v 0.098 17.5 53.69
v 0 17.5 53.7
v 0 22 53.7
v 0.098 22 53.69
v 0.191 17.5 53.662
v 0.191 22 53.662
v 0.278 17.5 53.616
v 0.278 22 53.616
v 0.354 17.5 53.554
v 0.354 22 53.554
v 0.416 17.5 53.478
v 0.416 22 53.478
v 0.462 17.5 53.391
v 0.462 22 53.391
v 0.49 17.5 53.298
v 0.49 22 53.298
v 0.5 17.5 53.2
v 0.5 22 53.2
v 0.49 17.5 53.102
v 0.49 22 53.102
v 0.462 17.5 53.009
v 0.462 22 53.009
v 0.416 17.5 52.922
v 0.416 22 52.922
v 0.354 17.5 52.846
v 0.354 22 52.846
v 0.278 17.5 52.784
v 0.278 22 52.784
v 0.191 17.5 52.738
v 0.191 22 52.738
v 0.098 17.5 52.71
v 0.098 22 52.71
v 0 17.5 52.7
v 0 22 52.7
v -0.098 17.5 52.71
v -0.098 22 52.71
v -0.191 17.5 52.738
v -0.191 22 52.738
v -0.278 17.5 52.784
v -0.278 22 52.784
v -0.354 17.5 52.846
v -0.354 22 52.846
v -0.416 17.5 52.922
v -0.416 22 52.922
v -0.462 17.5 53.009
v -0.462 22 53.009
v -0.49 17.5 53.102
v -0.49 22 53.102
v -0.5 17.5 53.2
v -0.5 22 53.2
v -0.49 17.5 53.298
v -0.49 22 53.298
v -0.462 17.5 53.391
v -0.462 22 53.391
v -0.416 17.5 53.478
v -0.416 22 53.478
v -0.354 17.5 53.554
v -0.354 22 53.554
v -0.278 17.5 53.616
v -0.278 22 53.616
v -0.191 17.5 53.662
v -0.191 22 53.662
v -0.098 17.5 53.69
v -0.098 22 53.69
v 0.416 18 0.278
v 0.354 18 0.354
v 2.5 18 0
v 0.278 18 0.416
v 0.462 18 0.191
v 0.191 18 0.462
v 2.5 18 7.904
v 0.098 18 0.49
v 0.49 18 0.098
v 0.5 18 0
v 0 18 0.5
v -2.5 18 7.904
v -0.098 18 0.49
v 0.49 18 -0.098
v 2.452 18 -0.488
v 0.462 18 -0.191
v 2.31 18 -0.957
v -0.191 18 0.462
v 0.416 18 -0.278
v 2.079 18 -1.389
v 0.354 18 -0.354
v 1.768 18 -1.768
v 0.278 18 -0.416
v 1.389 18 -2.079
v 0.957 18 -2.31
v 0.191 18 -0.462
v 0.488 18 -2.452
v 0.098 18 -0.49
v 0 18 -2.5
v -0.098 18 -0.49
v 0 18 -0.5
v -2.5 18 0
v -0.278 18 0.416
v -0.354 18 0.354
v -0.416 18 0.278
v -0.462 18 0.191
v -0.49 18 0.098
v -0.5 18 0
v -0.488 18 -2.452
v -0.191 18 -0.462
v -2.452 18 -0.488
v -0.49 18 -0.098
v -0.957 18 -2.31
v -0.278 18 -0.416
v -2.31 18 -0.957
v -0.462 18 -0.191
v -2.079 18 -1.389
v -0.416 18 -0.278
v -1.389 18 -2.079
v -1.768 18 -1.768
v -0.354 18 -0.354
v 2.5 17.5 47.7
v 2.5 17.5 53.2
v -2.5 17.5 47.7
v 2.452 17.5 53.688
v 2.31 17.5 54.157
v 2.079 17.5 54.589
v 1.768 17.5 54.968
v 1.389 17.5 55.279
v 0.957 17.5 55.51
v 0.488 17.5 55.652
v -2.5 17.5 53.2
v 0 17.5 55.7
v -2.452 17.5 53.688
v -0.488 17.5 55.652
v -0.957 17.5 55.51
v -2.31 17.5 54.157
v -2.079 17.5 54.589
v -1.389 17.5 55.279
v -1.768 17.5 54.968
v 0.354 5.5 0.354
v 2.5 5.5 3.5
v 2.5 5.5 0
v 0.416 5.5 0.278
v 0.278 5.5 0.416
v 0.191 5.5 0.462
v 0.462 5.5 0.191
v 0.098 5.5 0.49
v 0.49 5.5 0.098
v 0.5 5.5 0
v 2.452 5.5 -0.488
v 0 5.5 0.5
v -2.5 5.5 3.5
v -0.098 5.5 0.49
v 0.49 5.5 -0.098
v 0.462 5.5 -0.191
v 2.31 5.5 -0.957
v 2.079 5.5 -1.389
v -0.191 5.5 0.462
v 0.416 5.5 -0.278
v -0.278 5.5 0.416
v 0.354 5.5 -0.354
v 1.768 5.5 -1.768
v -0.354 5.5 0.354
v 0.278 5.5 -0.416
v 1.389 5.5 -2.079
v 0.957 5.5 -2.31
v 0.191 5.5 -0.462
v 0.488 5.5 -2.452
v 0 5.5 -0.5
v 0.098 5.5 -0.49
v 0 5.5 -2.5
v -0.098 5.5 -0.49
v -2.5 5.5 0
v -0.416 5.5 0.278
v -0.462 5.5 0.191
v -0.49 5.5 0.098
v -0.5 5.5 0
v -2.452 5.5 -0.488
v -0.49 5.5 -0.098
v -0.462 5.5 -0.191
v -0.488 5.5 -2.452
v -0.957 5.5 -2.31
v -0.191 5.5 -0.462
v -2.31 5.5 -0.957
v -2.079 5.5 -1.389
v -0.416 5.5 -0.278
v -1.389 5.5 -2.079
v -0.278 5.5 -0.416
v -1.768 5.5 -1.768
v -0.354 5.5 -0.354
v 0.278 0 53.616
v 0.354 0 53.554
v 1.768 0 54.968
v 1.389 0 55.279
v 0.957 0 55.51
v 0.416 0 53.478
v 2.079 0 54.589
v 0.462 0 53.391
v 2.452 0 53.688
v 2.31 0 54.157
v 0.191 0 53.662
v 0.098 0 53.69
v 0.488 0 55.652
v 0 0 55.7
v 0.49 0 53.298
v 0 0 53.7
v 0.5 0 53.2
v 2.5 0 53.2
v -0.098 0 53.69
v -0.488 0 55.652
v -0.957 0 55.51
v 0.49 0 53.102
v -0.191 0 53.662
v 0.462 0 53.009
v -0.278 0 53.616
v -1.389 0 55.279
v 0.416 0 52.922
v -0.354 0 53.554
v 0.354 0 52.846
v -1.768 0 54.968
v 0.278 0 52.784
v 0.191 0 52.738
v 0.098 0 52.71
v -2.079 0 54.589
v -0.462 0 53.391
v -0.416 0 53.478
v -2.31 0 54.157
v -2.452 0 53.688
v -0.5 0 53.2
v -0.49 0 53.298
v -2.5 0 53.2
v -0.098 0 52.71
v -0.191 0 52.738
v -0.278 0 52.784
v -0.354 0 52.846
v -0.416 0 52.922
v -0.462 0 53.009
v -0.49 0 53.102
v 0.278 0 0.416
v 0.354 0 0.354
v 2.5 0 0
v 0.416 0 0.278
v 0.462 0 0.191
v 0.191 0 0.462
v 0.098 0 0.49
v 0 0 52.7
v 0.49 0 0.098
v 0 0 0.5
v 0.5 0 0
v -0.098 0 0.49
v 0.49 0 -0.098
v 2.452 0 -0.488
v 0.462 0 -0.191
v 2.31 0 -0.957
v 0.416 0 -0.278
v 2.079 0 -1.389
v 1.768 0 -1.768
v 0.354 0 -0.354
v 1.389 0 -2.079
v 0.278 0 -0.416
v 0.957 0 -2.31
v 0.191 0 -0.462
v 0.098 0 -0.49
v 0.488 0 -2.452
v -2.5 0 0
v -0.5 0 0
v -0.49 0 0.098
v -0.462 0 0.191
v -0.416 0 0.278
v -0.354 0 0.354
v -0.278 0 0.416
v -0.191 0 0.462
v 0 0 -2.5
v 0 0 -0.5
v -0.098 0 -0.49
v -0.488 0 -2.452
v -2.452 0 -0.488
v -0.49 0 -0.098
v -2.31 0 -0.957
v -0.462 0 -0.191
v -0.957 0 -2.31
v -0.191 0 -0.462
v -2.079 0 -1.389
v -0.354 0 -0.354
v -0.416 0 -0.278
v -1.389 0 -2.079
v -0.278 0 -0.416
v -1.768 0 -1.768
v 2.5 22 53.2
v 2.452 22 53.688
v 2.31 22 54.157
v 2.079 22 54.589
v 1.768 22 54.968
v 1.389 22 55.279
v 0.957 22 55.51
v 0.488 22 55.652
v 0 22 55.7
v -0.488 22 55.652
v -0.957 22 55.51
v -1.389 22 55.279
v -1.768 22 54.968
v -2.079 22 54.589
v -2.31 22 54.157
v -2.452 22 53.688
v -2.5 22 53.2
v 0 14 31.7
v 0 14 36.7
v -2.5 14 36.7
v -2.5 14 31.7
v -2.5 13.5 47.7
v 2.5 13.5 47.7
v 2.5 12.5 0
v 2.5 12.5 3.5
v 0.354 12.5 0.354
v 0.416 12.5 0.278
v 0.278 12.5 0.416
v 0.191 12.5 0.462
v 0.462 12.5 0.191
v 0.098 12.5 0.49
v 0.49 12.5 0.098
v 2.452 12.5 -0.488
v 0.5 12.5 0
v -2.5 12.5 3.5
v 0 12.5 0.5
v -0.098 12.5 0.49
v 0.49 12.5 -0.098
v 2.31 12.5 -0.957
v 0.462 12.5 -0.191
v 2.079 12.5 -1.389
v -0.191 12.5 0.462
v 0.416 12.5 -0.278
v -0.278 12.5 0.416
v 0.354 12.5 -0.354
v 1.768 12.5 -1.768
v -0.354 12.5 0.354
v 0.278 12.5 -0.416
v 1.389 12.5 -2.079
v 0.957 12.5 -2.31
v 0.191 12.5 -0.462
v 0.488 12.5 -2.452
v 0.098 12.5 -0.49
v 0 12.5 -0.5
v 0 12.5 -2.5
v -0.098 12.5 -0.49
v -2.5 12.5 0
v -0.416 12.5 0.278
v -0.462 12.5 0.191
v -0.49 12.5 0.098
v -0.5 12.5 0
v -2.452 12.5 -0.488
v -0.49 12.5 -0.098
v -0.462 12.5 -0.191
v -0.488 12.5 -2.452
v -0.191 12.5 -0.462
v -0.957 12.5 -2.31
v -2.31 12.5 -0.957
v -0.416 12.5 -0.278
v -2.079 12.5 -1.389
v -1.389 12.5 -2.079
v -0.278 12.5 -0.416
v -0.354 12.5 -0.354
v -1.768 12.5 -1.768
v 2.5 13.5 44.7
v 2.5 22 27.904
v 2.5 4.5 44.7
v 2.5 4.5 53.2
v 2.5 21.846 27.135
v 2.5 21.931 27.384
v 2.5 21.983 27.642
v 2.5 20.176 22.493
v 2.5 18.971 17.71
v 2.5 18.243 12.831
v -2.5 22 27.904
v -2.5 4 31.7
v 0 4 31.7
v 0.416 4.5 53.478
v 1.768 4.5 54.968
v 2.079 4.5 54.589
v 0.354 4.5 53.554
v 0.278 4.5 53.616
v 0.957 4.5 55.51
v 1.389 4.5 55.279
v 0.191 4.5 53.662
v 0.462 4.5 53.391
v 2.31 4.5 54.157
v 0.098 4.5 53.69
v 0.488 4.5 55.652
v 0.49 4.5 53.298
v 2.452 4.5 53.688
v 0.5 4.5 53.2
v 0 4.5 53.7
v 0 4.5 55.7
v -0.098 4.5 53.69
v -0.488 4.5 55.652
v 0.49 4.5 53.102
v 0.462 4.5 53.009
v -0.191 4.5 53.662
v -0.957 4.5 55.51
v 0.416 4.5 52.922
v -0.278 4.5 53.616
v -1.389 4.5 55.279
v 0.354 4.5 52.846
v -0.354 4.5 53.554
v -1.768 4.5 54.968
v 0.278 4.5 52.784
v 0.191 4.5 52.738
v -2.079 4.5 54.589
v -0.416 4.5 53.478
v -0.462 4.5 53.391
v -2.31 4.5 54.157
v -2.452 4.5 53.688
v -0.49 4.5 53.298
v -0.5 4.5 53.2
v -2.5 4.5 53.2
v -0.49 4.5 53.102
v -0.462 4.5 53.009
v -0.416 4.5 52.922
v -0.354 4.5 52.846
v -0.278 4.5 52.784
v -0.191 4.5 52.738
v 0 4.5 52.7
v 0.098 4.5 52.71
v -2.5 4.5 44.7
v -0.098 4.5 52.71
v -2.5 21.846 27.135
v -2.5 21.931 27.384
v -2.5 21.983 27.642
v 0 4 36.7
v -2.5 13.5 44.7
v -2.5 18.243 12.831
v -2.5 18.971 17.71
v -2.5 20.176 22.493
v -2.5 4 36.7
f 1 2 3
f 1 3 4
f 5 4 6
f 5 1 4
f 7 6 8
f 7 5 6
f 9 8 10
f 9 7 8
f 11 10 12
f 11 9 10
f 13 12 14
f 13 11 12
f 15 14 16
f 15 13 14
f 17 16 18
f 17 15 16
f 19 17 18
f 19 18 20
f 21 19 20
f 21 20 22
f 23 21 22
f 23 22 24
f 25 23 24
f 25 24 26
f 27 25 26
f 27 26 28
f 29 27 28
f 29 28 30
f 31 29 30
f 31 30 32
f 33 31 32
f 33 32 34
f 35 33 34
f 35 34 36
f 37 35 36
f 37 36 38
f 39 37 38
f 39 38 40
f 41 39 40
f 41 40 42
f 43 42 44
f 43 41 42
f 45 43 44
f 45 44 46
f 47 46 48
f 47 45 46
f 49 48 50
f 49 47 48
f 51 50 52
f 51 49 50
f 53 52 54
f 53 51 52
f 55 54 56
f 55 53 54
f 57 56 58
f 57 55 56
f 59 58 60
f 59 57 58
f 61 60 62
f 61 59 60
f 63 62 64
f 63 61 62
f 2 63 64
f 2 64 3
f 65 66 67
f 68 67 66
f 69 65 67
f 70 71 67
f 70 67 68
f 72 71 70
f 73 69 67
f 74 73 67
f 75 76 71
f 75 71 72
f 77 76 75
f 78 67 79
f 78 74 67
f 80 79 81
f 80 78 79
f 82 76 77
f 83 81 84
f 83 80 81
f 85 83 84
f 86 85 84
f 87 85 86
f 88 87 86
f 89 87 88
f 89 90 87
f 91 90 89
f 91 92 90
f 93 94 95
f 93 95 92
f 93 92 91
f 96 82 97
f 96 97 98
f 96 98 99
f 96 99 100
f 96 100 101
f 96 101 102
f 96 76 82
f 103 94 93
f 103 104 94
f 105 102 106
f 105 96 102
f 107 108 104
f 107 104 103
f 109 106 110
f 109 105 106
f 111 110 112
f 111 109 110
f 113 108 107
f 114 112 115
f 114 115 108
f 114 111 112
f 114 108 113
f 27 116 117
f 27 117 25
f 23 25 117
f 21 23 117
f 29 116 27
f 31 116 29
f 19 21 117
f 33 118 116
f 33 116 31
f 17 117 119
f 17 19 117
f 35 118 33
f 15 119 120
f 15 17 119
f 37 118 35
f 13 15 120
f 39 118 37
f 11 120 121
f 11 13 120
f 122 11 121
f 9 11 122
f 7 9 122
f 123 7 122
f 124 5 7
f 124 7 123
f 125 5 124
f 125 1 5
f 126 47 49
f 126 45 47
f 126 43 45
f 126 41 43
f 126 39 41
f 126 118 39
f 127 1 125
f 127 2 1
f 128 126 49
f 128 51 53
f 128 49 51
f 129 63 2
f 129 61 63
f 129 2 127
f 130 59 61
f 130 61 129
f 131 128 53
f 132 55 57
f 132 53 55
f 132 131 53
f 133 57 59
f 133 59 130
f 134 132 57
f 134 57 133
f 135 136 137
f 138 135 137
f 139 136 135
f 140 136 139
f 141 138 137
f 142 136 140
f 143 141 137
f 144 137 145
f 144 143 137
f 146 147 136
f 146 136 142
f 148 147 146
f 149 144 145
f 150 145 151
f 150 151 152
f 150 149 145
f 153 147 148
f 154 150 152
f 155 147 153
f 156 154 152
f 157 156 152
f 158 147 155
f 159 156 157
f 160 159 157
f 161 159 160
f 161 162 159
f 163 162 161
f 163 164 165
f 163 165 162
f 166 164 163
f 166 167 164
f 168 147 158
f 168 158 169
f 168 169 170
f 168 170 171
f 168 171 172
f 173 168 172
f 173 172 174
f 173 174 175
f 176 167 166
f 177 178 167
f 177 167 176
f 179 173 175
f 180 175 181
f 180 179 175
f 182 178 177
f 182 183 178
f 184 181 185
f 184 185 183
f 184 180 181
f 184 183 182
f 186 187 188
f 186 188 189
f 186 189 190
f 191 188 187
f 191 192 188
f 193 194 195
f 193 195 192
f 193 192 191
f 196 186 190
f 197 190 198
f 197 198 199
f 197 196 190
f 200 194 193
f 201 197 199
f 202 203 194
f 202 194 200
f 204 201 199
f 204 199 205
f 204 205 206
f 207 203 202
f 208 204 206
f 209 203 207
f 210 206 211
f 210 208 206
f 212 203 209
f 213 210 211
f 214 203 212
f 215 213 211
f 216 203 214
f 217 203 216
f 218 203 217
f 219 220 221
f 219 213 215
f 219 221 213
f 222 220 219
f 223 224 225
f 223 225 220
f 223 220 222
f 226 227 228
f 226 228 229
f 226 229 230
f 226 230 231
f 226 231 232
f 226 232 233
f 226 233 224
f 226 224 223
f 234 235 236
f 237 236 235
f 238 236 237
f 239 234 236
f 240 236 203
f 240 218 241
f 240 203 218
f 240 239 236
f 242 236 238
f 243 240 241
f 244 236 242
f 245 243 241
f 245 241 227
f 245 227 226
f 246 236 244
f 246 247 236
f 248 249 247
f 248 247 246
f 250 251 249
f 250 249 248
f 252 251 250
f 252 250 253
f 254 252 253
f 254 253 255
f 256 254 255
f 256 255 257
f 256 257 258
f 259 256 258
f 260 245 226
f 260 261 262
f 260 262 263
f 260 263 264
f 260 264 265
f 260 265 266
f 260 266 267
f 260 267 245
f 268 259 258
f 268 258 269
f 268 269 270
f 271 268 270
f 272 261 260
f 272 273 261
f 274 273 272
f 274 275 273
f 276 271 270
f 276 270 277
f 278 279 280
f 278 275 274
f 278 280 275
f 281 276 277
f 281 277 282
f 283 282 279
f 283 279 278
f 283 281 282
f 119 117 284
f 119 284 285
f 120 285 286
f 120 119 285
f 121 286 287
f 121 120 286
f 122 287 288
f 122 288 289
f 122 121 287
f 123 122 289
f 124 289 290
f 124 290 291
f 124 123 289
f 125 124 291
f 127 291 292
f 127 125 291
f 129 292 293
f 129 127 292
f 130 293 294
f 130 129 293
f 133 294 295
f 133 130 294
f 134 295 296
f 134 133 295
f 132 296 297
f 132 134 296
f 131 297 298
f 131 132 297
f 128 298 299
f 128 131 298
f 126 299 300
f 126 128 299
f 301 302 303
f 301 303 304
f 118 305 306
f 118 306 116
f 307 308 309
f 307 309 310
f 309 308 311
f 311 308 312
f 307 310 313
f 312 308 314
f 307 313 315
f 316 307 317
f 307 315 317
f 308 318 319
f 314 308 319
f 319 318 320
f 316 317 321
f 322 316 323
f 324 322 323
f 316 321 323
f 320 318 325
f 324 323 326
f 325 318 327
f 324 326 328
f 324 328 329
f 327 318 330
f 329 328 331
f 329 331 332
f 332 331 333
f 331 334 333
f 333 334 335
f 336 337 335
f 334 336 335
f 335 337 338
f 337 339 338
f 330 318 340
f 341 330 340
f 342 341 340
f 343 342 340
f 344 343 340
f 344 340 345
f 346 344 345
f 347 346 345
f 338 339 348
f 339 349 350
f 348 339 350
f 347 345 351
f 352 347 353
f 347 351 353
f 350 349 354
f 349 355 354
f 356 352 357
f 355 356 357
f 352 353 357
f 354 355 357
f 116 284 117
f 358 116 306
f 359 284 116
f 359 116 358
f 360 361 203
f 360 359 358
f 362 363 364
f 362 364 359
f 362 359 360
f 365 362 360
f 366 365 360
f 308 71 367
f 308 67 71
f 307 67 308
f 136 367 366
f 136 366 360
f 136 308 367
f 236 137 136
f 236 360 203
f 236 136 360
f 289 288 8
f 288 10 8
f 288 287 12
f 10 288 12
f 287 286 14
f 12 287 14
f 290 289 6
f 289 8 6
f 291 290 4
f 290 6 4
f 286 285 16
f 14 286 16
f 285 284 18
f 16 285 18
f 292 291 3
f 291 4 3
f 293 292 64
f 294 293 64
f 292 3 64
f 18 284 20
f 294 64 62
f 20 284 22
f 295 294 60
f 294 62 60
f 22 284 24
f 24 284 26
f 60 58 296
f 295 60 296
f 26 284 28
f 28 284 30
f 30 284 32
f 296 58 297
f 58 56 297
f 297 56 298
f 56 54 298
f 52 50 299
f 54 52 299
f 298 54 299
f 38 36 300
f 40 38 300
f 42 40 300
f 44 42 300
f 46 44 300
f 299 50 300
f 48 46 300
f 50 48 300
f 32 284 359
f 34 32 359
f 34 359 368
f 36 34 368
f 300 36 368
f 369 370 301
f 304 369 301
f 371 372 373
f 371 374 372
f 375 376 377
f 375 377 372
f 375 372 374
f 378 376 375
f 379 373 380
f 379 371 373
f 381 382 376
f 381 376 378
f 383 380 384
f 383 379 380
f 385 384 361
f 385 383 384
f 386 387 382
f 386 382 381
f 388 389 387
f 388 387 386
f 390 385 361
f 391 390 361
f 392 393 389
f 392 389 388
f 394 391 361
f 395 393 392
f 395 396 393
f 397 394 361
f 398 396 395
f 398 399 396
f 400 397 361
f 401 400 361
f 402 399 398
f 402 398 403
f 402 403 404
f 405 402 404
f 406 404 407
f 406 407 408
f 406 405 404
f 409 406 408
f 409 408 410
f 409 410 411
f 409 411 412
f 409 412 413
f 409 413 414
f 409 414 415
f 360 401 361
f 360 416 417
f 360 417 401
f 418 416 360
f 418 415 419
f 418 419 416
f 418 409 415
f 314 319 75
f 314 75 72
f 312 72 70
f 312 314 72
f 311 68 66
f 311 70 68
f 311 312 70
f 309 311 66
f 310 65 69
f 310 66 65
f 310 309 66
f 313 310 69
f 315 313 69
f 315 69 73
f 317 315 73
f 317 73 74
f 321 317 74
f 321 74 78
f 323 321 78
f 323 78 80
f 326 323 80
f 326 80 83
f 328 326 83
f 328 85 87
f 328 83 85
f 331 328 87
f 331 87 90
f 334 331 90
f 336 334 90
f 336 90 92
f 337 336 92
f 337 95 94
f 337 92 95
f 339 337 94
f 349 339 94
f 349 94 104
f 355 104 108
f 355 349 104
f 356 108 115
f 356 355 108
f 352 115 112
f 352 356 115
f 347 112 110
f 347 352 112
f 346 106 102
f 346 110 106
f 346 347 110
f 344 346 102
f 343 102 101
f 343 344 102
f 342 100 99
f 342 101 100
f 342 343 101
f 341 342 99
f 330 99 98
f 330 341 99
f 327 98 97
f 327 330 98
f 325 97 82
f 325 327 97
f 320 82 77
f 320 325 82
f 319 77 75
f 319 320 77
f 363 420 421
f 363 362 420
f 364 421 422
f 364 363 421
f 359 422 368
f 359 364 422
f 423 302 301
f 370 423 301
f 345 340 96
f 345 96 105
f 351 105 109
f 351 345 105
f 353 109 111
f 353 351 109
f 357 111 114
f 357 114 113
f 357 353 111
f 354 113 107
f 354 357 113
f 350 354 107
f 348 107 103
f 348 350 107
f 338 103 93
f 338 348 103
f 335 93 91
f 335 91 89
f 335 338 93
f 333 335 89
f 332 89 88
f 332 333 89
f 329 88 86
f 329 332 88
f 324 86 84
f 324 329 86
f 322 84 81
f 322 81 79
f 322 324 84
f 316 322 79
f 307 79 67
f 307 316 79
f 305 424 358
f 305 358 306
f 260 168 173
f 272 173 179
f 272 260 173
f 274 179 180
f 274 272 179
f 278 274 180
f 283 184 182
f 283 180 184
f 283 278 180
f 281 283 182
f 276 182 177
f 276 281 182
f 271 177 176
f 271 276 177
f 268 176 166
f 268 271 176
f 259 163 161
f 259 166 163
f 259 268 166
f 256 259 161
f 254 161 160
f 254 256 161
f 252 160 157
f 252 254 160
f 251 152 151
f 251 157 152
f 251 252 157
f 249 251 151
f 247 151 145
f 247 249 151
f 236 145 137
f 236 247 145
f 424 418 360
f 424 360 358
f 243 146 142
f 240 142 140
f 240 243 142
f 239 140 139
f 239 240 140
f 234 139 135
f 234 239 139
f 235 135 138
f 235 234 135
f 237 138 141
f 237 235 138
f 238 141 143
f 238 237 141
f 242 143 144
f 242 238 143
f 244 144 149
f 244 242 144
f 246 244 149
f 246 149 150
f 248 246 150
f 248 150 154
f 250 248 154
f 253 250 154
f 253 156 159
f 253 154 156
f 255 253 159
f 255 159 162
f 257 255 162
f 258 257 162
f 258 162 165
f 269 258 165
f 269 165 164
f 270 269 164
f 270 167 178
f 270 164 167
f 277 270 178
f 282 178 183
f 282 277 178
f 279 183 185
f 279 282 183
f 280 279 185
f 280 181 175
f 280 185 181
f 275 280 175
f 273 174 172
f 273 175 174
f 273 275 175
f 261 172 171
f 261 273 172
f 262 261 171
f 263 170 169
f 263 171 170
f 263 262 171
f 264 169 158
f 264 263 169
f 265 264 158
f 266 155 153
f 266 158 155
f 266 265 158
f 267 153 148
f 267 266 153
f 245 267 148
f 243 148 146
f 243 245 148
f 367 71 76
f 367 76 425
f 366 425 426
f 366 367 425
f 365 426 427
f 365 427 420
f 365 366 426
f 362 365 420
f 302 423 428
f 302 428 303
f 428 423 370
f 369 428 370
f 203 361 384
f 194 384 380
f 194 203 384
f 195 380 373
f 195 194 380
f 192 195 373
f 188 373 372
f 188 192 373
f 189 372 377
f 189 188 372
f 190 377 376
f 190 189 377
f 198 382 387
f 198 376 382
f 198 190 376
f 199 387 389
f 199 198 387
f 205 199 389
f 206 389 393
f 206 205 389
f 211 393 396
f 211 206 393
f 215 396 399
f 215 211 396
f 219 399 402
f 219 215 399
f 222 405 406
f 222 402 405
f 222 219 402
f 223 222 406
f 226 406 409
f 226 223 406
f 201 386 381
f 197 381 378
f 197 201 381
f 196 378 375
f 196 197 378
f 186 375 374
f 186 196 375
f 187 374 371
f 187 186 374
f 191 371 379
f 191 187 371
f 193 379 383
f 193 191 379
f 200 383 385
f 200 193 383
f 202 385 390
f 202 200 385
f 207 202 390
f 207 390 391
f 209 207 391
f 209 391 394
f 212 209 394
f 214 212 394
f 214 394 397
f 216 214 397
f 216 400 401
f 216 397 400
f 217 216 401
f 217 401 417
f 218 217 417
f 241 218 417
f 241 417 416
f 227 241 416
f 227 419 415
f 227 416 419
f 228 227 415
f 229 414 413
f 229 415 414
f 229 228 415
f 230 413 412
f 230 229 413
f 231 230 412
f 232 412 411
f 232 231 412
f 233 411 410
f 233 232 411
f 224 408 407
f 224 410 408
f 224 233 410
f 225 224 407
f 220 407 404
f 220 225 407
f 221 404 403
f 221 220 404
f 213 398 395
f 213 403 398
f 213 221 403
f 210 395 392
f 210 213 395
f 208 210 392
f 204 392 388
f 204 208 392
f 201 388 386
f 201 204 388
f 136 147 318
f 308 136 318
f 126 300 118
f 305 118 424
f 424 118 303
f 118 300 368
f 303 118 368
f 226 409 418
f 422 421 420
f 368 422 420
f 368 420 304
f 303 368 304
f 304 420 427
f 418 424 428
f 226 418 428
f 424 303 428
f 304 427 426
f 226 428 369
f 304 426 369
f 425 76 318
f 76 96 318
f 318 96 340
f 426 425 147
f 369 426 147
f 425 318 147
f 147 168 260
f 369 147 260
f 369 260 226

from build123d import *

# Parameters (mm, degrees)
SKETCHSIDE_R                    = 0.5
BOSSEXTRUDESIDE_DEPTH           = 22
CUTEXTRUDEDISTALROOM_DEPTH      = 60.939469467
CUTEXTRUDEDISTALROOM_DEPTH_BACK = 60.939469467
SKETCHSESORROOM_W               = 5
SKETCHSESORROOM_H               = 10
CUTEXTRUDESENSORROOM_DEPTH      = 10
CUTEXTRUDESTRONGSIDE_DEPTH      = 60.939469467
CUTEXTRUDESTRONGSIDE_DEPTH_BACK = 60.939469467
SKETCHSTRONGSIDE_W              = 30
SKETCHSTRONGSIDE_H              = 4
FILLETSTRONGSIDE_R              = 50
FILLETSIDE_R                    = 2
CUTEXTRUDESPRINGROOM_DEPTH      = 60.939469467
CUTEXTRUDESPRINGROOM_DEPTH_BACK = 60.939469467
SKETCHSPRINGROOM_W              = 6
SKETCHSPRINGROOM_H              = 7


with BuildPart() as part:
    # SketchSide → BossExtrudeSide (new body)
    with BuildSketch(Plane(origin=(0, 0, 0), x_dir=(1, 0, 0), z_dir=(0, 1, 0))):
        with BuildLine():
            Line((-2.5, -24.778081045), (-2.5, 0))
            ThreePointArc((-2.5, 0), (0, 2.5), (2.5, 0))
            Line((2.5, 0), (2.5, -53.2))
            ThreePointArc((2.5, -53.2), (0, -55.7), (-2.5, -53.2))
            Line((-2.5, -53.2), (-2.5, -24.778081045))
        make_face()
        with Locations(Location((0, 0, 0), (0, 0, 270))):
            Circle(SKETCHSIDE_R, mode=Mode.SUBTRACT)
        with Locations(Location((0, -53.2, 0), (0, 0, 270))):
            Circle(SKETCHSIDE_R, mode=Mode.SUBTRACT)
    extrude(amount=BOSSEXTRUDESIDE_DEPTH)

    # SketchDistalRoom → CutExtrudeDistalRoom (cut, two sides: drawn at the far end of the back side and taken through both)
    with BuildSketch(Plane(origin=(0, 0, 0), x_dir=(0, 0, -1), z_dir=(1, 0, 0)).offset(-CUTEXTRUDEDISTALROOM_DEPTH_BACK)):
        Polygon((-44.7, 13.5), (-47.7, 13.5), (-47.7, 17.5), (-55.7, 17.5), (-55.7, 4.5), (-44.7, 4.5), align=None)
    extrude(amount=CUTEXTRUDEDISTALROOM_DEPTH + CUTEXTRUDEDISTALROOM_DEPTH_BACK, mode=Mode.SUBTRACT)

    # SketchSesorRoom → CutExtrudeSensorRoom (cut)
    with BuildSketch(Plane(origin=(0, 0, 0), x_dir=(0, 0, -1), z_dir=(1, 0, 0))):
        with Locations((-34.2, 9)):
            Rectangle(SKETCHSESORROOM_W, SKETCHSESORROOM_H)
    extrude(amount=-CUTEXTRUDESENSORROOM_DEPTH, mode=Mode.SUBTRACT)

    # SketchStrongSide → CutExtrudeStrongSide (cut, two sides: drawn at the far end of the back side and taken through both)
    with BuildSketch(Plane(origin=(0, 0, 0), x_dir=(0, 0, -1), z_dir=(1, 0, 0)).offset(-CUTEXTRUDESTRONGSIDE_DEPTH_BACK)):
        with Locations((-12.5, 20)):
            Rectangle(SKETCHSTRONGSIDE_W, SKETCHSTRONGSIDE_H)
    extrude(amount=CUTEXTRUDESTRONGSIDE_DEPTH + CUTEXTRUDESTRONGSIDE_DEPTH_BACK, mode=Mode.SUBTRACT)

    # FilletStrongSide
    # the kernel refuses this fillet: 50 mm, written as the material it adds along each edge
    with BuildSketch(Plane(origin=(2.5, 18, 27.5), x_dir=(0, 1, 0), z_dir=(-1, 0, 0))) as filletstrongside_piece_1:
        with BuildLine():
            CenterArc((50, 19.595917942), FILLETSTRONGSIDE_R, 180, 23.073918066)
            Line((0, 19.595917942), (-1, 19.595917942))
            Line((-1, 19.595917942), (-1, 0))
            Line((-1, 0), (0, -1))
            ThreePointArc((0, -1), (2, -1), (3.08, -0.391918359))
            Line((3.08, -0.391918359), (4, 0))
        make_face()
    extrude(amount=5)

    # FilletSide
    filletside_edges = [part.edges().sort_by_distance(p)[0] for p in [
        (0, 22, 27.5),
    ]]
    fillet(filletside_edges, radius=FILLETSIDE_R)

    # SketchSpringRoom → CutExtrudeSpringRoom (cut, two sides: drawn at the far end of the back side and taken through both)
    with BuildSketch(Plane(origin=(0, 0, 0), x_dir=(0, 0, -1), z_dir=(1, 0, 0)).offset(-CUTEXTRUDESPRINGROOM_DEPTH_BACK)):
        with Locations((-0.5, 9)):
            Rectangle(SKETCHSPRINGROOM_W, SKETCHSPRINGROOM_H)
    extrude(amount=CUTEXTRUDESPRINGROOM_DEPTH + CUTEXTRUDESPRINGROOM_DEPTH_BACK, mode=Mode.SUBTRACT)


solid = part.part
